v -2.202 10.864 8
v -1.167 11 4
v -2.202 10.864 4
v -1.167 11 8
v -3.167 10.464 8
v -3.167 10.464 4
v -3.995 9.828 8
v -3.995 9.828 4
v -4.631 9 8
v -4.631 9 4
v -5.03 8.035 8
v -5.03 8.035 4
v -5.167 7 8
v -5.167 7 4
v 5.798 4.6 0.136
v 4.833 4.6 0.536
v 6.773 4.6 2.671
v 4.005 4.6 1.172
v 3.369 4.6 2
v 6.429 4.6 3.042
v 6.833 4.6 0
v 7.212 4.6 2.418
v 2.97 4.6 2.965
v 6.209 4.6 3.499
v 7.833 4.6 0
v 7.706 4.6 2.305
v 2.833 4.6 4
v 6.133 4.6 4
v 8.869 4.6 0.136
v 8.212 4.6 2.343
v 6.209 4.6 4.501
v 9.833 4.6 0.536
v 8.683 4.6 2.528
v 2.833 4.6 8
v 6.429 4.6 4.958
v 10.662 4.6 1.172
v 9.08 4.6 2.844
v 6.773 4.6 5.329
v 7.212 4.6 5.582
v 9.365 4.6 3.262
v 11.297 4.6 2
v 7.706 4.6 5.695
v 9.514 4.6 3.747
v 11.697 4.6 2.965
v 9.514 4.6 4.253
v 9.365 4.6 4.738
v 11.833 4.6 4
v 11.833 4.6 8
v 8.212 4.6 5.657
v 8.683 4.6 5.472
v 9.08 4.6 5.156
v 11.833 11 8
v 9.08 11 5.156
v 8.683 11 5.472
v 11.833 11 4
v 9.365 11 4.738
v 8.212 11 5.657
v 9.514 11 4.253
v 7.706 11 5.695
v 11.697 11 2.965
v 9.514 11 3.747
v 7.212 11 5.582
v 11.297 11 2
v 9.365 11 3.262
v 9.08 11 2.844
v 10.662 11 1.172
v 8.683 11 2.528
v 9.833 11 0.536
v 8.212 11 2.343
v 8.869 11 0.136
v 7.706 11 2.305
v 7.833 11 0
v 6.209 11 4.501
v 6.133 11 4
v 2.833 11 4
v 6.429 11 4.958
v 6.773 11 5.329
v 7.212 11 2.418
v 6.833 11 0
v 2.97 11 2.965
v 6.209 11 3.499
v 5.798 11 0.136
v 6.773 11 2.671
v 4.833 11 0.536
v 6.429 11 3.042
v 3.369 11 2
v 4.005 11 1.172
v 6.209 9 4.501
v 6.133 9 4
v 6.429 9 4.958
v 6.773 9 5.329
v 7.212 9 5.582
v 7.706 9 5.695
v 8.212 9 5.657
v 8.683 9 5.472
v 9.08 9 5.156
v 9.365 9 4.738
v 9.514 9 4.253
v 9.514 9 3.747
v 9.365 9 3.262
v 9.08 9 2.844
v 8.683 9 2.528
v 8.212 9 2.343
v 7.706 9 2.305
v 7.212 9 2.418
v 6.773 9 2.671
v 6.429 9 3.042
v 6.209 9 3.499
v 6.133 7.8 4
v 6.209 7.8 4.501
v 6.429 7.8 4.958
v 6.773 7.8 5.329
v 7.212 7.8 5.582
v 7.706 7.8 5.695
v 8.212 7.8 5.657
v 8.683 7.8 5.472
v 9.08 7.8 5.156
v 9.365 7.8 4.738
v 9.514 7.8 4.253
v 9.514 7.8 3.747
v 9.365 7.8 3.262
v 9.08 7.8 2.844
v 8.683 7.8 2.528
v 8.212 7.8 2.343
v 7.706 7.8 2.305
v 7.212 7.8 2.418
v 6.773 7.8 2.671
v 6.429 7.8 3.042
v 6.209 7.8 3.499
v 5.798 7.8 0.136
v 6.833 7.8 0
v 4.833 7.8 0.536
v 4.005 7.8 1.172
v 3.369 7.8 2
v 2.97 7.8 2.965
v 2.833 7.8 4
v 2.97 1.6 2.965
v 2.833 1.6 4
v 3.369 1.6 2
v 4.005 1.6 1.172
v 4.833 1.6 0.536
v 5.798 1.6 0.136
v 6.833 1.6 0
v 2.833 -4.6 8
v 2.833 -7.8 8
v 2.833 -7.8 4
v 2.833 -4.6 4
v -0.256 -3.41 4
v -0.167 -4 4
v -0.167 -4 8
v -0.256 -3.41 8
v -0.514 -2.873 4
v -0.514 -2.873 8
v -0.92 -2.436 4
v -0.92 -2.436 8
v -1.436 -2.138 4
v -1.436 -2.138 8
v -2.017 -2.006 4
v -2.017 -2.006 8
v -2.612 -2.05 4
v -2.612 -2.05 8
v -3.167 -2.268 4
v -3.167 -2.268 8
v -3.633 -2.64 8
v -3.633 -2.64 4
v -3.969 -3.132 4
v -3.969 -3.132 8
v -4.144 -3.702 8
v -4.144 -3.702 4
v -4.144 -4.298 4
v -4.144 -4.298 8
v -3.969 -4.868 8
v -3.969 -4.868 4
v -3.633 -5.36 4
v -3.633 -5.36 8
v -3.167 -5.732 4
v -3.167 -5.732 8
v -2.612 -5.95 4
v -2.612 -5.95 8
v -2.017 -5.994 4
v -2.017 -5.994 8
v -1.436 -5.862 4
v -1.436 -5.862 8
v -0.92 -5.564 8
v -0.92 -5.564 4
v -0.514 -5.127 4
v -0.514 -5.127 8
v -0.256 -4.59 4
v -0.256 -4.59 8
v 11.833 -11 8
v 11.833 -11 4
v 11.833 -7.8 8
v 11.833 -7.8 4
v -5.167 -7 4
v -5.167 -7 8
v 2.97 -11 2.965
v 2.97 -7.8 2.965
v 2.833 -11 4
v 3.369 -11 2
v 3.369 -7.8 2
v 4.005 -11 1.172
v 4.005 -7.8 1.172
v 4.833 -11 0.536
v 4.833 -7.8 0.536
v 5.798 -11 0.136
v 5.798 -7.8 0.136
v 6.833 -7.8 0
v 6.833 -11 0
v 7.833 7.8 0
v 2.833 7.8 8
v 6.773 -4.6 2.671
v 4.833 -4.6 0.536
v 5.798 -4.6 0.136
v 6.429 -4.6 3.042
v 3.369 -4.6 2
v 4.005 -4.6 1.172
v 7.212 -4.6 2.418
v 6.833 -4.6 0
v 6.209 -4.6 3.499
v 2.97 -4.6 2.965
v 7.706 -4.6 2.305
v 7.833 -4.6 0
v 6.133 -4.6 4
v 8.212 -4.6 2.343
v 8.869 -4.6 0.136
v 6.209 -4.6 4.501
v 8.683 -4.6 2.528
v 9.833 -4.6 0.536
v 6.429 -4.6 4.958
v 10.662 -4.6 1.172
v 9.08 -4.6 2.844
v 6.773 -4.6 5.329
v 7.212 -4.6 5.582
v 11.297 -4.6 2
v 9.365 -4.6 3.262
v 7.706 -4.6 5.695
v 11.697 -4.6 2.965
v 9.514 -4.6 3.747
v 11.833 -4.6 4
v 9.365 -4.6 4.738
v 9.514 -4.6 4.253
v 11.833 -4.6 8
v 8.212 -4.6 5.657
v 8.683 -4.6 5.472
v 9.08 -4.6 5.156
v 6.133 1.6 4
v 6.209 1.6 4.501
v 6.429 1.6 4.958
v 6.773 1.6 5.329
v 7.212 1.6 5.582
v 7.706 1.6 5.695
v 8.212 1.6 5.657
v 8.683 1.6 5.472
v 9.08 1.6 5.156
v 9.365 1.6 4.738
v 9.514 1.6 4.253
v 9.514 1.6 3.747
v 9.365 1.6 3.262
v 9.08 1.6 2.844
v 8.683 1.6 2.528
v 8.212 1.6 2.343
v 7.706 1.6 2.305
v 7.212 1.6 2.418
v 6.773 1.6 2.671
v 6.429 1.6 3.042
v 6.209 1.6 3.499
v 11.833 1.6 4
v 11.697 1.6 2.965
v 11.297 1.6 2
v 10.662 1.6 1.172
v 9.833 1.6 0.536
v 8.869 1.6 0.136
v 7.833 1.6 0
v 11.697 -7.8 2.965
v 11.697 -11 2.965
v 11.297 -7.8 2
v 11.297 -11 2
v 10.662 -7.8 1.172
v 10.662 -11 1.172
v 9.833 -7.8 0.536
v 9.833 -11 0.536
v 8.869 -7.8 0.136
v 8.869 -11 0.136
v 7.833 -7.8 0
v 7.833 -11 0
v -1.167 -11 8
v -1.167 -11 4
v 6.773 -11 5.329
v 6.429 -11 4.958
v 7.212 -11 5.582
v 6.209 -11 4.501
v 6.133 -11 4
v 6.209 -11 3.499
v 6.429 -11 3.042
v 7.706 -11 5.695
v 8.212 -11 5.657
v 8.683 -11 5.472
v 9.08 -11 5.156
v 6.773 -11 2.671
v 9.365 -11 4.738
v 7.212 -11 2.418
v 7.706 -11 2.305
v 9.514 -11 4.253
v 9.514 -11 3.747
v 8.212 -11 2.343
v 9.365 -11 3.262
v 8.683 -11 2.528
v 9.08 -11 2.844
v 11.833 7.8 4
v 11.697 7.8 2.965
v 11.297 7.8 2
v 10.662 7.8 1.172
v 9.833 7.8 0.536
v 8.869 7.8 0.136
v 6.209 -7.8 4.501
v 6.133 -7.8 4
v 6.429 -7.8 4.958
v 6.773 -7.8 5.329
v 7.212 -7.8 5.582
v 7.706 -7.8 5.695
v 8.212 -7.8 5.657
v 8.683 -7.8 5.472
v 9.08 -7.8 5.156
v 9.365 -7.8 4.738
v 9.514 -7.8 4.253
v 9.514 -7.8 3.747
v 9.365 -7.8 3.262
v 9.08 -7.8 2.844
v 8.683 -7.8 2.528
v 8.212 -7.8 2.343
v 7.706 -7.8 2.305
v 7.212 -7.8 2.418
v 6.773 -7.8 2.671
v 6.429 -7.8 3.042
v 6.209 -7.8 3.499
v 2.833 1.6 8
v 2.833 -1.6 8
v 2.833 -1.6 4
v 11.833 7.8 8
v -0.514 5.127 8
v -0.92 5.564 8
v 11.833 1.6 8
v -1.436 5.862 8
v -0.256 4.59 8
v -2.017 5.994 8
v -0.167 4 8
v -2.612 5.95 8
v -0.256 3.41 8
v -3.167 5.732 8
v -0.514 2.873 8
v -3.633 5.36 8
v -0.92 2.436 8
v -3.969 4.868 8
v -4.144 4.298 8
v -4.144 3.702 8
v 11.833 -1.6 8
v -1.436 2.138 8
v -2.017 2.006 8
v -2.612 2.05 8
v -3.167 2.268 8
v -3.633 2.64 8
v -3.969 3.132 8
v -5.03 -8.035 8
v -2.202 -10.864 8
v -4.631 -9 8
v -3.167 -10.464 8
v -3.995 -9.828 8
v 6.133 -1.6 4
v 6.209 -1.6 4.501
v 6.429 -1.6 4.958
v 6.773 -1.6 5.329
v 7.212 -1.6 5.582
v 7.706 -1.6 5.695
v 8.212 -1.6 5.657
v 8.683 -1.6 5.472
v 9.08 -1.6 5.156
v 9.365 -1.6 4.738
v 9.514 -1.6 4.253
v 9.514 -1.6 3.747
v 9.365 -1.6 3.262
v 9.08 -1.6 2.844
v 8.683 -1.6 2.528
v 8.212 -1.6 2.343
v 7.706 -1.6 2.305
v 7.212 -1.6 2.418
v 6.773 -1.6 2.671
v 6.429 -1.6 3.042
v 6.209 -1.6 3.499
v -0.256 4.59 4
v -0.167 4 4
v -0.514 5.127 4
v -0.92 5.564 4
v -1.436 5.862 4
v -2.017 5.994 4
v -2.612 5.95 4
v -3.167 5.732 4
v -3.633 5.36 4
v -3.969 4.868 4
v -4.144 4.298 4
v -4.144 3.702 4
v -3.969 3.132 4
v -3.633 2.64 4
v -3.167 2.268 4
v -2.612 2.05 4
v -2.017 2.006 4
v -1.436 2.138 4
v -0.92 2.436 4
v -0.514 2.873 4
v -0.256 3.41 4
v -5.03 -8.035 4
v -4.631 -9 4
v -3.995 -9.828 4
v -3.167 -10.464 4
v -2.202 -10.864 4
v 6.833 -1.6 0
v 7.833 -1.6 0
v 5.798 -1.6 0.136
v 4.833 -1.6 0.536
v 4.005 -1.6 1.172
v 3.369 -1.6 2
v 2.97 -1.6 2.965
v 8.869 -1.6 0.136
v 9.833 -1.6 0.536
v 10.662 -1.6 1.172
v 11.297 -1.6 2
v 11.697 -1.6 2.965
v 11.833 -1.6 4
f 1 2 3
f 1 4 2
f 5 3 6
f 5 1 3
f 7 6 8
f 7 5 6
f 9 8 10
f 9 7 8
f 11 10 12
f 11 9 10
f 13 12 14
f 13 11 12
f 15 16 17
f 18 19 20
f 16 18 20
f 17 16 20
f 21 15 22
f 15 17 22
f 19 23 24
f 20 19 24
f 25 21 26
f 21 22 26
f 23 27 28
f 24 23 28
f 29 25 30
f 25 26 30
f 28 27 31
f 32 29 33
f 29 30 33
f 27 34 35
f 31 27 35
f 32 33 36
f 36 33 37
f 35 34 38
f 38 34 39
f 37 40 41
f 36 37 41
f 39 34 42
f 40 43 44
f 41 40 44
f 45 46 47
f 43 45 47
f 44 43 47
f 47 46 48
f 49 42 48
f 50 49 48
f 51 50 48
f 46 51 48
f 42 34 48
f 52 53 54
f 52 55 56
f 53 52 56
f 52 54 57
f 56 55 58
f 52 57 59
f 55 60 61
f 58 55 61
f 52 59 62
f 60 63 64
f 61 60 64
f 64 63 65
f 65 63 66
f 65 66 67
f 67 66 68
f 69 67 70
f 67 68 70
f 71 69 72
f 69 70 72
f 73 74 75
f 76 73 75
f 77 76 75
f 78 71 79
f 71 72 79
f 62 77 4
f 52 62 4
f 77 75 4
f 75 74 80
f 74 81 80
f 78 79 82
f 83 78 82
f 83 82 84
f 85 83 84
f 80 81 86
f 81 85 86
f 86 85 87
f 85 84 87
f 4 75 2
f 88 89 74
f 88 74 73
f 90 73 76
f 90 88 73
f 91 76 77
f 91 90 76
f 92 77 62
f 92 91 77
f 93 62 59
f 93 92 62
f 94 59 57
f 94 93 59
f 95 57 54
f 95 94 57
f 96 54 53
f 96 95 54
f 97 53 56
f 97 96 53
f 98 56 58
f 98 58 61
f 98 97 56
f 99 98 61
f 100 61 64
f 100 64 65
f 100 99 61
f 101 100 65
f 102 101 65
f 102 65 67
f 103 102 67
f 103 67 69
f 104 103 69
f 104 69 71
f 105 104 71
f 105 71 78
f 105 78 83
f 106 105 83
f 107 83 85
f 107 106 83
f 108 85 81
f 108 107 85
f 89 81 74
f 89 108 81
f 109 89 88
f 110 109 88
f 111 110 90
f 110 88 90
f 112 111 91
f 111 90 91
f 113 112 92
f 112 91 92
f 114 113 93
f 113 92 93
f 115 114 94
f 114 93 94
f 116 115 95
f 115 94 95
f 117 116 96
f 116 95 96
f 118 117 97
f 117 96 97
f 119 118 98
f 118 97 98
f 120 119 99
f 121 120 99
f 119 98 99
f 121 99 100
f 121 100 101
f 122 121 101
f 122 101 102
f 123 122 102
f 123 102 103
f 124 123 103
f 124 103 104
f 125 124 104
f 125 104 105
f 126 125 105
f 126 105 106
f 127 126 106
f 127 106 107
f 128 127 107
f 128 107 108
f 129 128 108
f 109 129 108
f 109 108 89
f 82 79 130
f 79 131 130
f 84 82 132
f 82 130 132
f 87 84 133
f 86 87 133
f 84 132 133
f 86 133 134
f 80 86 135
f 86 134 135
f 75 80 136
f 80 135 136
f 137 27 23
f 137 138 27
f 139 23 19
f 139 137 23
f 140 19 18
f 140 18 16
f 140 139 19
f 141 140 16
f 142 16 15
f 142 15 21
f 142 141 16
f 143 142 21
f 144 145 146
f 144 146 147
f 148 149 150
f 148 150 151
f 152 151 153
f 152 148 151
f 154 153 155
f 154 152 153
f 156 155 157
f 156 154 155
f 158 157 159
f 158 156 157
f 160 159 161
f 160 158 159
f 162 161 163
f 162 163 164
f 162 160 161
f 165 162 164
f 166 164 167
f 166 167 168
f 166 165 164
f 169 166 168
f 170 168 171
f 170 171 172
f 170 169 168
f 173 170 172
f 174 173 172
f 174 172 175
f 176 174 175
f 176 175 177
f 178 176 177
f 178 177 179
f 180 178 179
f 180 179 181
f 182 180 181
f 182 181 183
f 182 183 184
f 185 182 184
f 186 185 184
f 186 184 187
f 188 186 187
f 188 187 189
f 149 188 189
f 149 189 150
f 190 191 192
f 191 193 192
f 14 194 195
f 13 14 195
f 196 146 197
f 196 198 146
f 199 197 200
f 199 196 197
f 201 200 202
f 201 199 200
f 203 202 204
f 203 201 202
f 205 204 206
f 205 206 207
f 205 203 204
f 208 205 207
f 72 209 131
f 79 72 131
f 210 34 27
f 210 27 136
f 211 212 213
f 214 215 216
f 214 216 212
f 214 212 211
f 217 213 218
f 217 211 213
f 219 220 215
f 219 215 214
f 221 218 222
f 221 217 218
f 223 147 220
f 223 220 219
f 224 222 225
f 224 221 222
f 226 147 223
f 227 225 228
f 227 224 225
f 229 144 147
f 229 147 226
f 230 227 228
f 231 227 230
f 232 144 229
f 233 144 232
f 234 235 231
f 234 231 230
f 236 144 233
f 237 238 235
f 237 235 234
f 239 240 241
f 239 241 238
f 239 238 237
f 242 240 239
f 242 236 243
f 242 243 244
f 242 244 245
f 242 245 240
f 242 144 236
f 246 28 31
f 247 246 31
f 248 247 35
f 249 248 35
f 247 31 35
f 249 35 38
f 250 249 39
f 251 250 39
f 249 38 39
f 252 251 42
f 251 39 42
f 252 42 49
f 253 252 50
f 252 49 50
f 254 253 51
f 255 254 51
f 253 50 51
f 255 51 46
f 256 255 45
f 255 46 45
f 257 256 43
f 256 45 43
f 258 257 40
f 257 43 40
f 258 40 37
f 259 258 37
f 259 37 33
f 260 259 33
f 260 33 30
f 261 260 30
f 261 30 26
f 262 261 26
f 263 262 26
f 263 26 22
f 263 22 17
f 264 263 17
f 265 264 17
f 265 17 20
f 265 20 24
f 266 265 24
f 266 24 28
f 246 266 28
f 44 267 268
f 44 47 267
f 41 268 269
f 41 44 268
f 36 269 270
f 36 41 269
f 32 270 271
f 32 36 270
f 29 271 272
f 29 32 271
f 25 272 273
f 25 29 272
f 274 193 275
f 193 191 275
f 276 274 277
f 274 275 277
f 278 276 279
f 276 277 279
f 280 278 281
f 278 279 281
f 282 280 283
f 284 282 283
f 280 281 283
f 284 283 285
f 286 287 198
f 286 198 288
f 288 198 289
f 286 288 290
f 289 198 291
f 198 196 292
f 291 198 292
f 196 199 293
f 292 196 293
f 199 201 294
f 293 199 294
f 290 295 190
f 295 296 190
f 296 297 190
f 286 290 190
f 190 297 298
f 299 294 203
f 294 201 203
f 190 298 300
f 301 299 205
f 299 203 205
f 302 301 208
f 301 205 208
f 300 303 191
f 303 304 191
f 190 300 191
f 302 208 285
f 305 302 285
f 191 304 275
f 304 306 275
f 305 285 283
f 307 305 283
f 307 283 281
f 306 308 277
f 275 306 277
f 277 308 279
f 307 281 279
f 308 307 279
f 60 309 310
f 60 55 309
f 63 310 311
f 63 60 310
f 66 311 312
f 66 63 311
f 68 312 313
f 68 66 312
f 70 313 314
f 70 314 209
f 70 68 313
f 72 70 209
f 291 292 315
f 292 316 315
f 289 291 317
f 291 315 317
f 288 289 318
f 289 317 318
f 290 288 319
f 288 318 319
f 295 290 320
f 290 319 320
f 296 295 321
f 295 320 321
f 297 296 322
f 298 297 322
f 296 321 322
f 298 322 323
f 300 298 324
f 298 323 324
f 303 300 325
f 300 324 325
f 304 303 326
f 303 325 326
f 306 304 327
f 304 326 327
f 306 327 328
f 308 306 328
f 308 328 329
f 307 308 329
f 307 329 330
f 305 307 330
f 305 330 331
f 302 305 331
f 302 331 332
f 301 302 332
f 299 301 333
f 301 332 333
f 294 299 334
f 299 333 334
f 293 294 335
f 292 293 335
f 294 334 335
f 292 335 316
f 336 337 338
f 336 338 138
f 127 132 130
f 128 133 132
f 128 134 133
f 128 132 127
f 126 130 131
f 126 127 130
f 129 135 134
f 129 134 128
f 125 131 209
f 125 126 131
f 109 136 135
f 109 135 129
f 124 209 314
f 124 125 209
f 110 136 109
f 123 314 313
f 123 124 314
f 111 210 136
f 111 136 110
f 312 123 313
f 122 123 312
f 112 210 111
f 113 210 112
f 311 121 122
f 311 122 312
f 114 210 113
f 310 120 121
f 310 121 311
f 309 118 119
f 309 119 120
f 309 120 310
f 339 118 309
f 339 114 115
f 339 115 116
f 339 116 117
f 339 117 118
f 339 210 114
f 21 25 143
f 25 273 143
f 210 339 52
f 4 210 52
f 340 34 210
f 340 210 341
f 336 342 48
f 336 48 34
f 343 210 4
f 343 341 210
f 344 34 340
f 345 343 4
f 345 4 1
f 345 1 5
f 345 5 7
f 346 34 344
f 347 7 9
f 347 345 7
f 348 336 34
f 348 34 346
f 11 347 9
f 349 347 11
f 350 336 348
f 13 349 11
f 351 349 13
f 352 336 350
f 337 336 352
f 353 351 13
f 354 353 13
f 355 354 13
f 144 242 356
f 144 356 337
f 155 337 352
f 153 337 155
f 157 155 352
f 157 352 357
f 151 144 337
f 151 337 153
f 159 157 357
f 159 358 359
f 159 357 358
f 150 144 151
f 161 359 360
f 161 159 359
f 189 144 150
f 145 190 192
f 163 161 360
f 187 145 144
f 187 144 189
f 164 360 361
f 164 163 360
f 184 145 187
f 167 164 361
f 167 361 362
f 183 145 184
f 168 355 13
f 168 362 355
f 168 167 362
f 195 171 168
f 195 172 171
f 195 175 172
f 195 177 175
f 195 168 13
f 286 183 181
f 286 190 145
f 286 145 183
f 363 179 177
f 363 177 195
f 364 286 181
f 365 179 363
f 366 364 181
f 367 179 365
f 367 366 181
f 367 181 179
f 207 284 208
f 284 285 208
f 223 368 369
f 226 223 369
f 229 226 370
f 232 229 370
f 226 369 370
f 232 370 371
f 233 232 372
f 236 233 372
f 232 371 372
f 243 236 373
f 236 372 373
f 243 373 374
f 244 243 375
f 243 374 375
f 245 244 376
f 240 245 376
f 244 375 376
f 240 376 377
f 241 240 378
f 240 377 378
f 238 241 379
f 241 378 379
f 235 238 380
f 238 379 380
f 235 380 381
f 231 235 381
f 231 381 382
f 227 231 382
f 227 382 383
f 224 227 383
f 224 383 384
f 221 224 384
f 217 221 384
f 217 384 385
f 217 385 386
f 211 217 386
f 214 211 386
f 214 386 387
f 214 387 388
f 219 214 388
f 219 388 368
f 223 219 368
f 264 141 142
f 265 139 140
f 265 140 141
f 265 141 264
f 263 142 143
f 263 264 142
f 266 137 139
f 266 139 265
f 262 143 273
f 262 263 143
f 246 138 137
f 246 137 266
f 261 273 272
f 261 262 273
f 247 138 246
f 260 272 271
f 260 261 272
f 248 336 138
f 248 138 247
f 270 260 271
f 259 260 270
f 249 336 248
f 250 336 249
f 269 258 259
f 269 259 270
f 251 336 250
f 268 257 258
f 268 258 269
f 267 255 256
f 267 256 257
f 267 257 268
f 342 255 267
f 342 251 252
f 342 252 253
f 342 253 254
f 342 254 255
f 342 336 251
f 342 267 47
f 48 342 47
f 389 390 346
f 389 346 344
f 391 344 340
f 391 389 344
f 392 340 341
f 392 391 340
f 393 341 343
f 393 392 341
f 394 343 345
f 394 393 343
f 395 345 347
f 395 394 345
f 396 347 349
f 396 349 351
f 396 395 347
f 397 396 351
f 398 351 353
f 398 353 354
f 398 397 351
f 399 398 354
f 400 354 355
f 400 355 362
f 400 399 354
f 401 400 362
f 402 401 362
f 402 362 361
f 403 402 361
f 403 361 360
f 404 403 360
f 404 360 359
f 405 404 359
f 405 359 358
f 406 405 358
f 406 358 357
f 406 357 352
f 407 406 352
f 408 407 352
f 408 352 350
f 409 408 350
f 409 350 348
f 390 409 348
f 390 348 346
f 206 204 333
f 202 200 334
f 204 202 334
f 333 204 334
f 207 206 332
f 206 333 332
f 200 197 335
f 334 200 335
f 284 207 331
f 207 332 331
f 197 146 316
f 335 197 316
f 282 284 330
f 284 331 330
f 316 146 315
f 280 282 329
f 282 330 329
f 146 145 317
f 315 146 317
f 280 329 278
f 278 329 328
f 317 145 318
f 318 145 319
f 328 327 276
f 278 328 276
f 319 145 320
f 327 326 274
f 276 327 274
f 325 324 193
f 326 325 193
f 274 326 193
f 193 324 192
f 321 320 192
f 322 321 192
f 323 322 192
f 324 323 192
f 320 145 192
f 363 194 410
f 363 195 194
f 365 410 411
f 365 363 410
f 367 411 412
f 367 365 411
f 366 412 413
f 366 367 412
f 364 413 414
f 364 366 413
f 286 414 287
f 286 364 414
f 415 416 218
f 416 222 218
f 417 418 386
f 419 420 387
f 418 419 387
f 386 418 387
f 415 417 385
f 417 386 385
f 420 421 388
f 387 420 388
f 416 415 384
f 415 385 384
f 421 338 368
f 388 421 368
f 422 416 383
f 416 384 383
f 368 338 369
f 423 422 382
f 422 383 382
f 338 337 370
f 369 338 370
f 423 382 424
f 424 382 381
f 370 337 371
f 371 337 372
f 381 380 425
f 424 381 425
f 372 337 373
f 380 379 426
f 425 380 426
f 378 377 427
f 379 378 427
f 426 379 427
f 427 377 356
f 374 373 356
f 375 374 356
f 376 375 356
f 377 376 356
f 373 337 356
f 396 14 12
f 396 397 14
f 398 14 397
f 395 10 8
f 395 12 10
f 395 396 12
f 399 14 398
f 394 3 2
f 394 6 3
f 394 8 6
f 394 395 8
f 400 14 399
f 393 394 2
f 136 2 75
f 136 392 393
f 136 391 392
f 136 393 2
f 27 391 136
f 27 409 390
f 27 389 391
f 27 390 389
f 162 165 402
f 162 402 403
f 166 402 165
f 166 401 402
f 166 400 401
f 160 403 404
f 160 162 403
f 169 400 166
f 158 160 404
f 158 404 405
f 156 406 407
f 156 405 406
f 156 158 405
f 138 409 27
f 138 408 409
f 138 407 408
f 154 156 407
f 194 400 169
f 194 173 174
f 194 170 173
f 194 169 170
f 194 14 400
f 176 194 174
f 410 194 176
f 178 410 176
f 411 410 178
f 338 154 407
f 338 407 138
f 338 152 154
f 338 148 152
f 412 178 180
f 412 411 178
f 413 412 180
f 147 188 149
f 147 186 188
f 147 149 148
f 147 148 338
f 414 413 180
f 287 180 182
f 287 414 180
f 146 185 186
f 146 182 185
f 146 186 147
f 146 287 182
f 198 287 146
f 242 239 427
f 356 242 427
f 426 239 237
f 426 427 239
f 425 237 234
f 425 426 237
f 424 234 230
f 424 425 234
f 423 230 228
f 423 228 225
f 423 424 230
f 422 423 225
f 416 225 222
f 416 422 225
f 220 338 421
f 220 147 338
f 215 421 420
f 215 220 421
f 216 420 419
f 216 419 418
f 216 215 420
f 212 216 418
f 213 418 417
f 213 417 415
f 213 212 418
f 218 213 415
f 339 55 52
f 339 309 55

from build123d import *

# Parameters (mm, degrees)
F0_W     = 7
F0_H     = 18
F0_R     = 2
F0_W_2   = 10
F1_DEPTH = 8
F3_D     = 3.4
F4_W     = 9
F4_H     = 3.2
F5_DEPTH = 25
F6_DEPTH = 2
F7_DEPTH = 2
F8_R     = 2
F9_DEPTH = 4
F10_R    = 3.99999


# Not quite as in the source:
# - a fillet or chamfer is up to 0.001 mm smaller than in the source, because OpenCascade refuses the exact size


with BuildPart() as f1:
    # F0 (on Top) → F1 (new body)
    with BuildSketch(Plane.XY):
        with Locations((-1.6666666667, 0)):
            Rectangle(F0_W, F0_H)
        with Locations((-2.1666666667, -4)):
            Circle(F0_R, mode=Mode.SUBTRACT)
        with Locations((-2.1666666667, 4)):
            Circle(F0_R, mode=Mode.SUBTRACT)
        with Locations((6.8333333333, 0)):
            Rectangle(F0_W_2, F0_H)
    extrude(amount=F1_DEPTH)

    # F3 (through all)
    with Locations(Plane.XZ.offset(9)):
        with Locations((7.8333333333, 4)):
            Hole(F3_D / 2)

    # F4 (on face) → F5 (cut)
    with BuildSketch(Plane.XY.offset(8)):
        with Locations((7.3333333333, 6.2)):
            Rectangle(F4_W, F4_H)
        with Locations((7.3333333333, 0)):
            Rectangle(F4_W, F4_H)
        with Locations((7.3333333333, -6.2)):
            Rectangle(F4_W, F4_H)
    extrude(amount=-F5_DEPTH, mode=Mode.SUBTRACT)

    # F6 (add): a face of the model
    f6_faces = [f1.faces().sort_by_distance(p)[0] for p in [
        (3.0114285443, -9, 4),
    ]]
    extrude(f6_faces, amount=F6_DEPTH)

    # F7 (add): a face of the model
    f7_faces = [f1.faces().sort_by_distance(p)[0] for p in [
        (3.0114285443, 9, 4),
    ]]
    extrude(f7_faces, amount=F7_DEPTH)

    # F8 (on face) → F9 (cut)
    with BuildSketch(Plane(origin=(0, 0, 0), x_dir=(1, 0, 0), z_dir=(0, 0, -1))):
        Polygon((2.8333333333, 7.8), (2.8333333333, 11), (-5.1666666667, 11), (-5.1666666667, -11), (2.8333333333, -11), (2.8333333333, -7.8), (2.8333333333, -4.6), (2.8333333333, -1.6), (2.8333333333, 1.6), (2.8333333333, 4.6), align=None)
        with Locations((-2.1666666667, -4)):
            Circle(F8_R, mode=Mode.SUBTRACT)
        with Locations((-2.1666666667, 4)):
            Circle(F8_R, mode=Mode.SUBTRACT)
    extrude(amount=-F9_DEPTH, mode=Mode.SUBTRACT)

    # F10 (radius 4 in the source; OpenCascade refuses exactly that, so slightly less here)
    f10_edges = [f1.edges().sort_by_distance(p)[0] for p in [
        (-5.166667, -11, 6),
        (-5.166667, 11, 6),
        (2.833333, -9.4, 0),
        (2.833333, -3.1, 0),
        (2.833333, 3.1, 0),
        (2.833333, 9.4, 0),
        (11.833333, -9.4, 0),
        (11.833333, -3.1, 0),
        (11.833333, 3.1, 0),
        (11.833333, 9.4, 0),
    ]]
    fillet(f10_edges, radius=F10_R)


solid = f1.part
